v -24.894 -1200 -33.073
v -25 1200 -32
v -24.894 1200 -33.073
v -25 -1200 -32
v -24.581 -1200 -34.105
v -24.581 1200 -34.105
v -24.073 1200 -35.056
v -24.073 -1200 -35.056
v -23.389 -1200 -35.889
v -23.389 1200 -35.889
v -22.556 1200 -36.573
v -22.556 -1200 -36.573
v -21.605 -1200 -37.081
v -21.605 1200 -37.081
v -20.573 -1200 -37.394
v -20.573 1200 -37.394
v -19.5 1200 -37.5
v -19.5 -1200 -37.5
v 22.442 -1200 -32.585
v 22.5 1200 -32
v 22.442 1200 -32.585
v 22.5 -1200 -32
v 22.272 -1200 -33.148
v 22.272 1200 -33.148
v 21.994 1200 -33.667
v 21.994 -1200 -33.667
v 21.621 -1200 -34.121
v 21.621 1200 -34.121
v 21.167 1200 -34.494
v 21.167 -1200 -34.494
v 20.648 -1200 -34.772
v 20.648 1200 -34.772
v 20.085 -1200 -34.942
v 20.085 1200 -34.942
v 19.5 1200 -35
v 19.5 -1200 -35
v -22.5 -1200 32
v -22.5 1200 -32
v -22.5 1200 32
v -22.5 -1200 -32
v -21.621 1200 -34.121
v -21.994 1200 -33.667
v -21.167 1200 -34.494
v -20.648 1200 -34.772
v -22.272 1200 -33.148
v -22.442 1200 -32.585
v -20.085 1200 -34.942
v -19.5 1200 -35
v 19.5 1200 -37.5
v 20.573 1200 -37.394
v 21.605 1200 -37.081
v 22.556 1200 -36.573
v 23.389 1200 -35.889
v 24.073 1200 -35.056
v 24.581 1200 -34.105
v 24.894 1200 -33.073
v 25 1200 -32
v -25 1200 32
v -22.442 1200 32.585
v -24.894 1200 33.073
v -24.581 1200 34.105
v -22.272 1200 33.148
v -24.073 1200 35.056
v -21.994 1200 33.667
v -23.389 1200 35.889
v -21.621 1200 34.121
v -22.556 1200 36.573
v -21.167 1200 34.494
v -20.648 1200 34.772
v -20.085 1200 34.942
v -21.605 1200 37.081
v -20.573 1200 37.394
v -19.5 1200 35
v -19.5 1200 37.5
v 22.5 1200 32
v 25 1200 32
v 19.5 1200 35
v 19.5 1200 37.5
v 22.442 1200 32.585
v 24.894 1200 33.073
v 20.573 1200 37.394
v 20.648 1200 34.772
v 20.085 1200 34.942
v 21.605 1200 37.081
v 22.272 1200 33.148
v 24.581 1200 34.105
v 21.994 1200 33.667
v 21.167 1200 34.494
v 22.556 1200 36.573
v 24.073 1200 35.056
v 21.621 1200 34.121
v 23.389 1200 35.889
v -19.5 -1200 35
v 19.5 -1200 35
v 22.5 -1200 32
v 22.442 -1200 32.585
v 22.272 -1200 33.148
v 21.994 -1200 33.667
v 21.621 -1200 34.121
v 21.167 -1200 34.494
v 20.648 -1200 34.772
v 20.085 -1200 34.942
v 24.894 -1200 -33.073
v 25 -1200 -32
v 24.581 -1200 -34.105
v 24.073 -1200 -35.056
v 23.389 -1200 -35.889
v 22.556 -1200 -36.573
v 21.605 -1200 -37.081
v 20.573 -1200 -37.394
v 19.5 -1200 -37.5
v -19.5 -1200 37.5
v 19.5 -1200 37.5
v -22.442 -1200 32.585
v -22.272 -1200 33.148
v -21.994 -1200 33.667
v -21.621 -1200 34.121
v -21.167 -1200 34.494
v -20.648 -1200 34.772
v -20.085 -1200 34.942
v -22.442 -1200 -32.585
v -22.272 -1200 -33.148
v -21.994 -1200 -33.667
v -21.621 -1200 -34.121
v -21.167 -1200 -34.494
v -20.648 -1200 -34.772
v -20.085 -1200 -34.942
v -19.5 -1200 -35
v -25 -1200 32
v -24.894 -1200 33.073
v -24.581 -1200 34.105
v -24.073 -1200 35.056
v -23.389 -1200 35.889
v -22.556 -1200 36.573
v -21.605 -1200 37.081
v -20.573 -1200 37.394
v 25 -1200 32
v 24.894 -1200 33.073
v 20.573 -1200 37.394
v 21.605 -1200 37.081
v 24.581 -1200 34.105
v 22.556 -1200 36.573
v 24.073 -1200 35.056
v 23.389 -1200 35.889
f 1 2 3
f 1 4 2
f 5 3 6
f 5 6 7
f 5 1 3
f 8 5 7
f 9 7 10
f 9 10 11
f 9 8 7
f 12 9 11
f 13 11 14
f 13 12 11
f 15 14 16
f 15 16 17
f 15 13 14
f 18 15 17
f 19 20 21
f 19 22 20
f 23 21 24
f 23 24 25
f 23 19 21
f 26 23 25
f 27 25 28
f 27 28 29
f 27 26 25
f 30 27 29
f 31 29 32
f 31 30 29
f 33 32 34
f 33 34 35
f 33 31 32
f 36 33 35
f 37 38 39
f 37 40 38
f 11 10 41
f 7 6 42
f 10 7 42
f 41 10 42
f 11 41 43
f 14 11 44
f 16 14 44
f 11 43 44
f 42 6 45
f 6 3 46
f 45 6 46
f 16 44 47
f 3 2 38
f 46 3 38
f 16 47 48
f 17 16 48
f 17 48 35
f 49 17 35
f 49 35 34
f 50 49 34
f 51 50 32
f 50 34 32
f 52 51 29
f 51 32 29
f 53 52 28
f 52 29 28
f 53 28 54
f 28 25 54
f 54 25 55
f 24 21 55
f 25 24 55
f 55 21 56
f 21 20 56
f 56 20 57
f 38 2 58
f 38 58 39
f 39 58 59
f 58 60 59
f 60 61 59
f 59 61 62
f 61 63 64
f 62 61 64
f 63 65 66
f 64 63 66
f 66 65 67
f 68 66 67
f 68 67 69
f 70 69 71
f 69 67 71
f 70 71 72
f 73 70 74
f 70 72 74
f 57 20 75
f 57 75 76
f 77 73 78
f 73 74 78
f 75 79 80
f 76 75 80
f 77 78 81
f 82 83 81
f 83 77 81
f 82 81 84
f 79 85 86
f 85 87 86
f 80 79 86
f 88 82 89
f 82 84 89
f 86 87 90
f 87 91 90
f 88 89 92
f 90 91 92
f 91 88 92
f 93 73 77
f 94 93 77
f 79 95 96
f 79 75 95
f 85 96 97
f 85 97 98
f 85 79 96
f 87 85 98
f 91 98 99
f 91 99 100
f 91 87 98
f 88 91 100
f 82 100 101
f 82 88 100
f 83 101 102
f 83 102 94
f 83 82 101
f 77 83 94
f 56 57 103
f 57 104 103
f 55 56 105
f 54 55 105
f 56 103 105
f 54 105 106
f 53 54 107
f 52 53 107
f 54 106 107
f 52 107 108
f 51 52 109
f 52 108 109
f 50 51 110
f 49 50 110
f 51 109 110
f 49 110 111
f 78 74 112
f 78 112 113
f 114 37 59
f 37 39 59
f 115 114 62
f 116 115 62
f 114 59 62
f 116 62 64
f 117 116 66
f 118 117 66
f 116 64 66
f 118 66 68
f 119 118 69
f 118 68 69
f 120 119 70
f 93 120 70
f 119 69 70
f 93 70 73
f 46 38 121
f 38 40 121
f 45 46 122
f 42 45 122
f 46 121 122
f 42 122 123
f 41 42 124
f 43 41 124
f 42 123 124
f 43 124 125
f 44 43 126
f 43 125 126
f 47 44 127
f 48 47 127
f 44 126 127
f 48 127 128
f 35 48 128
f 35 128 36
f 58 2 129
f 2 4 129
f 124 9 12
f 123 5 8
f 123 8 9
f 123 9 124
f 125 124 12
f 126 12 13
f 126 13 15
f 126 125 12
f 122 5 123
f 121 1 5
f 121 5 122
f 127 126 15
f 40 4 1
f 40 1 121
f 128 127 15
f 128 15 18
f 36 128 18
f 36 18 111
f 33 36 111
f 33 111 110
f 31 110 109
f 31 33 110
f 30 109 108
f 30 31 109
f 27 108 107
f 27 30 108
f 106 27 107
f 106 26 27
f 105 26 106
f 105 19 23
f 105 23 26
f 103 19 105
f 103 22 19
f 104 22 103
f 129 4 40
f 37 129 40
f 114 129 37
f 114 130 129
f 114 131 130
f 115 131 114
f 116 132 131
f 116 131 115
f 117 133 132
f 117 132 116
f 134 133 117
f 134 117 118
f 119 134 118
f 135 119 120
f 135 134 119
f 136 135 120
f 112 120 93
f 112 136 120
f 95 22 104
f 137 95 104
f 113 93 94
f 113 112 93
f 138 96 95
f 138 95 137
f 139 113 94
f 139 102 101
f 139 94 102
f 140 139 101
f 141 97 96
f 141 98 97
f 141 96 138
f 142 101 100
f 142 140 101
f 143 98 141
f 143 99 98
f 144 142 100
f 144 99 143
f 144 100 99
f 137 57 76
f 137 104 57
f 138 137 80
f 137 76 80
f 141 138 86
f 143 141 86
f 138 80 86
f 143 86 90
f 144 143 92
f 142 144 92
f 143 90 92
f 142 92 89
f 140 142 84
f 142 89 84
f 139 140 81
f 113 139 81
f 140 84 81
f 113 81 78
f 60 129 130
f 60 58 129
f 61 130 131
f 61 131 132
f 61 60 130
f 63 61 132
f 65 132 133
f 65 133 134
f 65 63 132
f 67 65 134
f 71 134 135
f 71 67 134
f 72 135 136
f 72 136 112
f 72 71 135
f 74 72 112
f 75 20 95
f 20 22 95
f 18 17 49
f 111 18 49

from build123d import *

# Parameters (mm, degrees)
F0_W     = 50
F0_H     = 75
F1_DEPTH = 1200
F2_R     = 5.5
F3_T     = -2.5


with BuildPart() as f1:
    # F0 (on Front) → F1 (new body, symmetric)
    with BuildSketch(Plane.XZ):
        Rectangle(F0_W, F0_H)
    extrude(amount=F1_DEPTH, both=True)

    # F2
    f2_edges = [f1.edges().sort_by_distance(p)[0] for p in [
        (25, 0, 37.5),
        (-25, 0, 37.5),
        (-25, 0, -37.5),
        (25, 0, -37.5),
    ]]
    fillet(f2_edges, radius=F2_R)

    # F3
    f3_openings = [f1.faces().sort_by_distance(p)[0] for p in [
        (0, -1200, 0),
        (0, 1200, 0),
    ]]
    offset(amount=F3_T, openings=f3_openings)


solid = f1.part
